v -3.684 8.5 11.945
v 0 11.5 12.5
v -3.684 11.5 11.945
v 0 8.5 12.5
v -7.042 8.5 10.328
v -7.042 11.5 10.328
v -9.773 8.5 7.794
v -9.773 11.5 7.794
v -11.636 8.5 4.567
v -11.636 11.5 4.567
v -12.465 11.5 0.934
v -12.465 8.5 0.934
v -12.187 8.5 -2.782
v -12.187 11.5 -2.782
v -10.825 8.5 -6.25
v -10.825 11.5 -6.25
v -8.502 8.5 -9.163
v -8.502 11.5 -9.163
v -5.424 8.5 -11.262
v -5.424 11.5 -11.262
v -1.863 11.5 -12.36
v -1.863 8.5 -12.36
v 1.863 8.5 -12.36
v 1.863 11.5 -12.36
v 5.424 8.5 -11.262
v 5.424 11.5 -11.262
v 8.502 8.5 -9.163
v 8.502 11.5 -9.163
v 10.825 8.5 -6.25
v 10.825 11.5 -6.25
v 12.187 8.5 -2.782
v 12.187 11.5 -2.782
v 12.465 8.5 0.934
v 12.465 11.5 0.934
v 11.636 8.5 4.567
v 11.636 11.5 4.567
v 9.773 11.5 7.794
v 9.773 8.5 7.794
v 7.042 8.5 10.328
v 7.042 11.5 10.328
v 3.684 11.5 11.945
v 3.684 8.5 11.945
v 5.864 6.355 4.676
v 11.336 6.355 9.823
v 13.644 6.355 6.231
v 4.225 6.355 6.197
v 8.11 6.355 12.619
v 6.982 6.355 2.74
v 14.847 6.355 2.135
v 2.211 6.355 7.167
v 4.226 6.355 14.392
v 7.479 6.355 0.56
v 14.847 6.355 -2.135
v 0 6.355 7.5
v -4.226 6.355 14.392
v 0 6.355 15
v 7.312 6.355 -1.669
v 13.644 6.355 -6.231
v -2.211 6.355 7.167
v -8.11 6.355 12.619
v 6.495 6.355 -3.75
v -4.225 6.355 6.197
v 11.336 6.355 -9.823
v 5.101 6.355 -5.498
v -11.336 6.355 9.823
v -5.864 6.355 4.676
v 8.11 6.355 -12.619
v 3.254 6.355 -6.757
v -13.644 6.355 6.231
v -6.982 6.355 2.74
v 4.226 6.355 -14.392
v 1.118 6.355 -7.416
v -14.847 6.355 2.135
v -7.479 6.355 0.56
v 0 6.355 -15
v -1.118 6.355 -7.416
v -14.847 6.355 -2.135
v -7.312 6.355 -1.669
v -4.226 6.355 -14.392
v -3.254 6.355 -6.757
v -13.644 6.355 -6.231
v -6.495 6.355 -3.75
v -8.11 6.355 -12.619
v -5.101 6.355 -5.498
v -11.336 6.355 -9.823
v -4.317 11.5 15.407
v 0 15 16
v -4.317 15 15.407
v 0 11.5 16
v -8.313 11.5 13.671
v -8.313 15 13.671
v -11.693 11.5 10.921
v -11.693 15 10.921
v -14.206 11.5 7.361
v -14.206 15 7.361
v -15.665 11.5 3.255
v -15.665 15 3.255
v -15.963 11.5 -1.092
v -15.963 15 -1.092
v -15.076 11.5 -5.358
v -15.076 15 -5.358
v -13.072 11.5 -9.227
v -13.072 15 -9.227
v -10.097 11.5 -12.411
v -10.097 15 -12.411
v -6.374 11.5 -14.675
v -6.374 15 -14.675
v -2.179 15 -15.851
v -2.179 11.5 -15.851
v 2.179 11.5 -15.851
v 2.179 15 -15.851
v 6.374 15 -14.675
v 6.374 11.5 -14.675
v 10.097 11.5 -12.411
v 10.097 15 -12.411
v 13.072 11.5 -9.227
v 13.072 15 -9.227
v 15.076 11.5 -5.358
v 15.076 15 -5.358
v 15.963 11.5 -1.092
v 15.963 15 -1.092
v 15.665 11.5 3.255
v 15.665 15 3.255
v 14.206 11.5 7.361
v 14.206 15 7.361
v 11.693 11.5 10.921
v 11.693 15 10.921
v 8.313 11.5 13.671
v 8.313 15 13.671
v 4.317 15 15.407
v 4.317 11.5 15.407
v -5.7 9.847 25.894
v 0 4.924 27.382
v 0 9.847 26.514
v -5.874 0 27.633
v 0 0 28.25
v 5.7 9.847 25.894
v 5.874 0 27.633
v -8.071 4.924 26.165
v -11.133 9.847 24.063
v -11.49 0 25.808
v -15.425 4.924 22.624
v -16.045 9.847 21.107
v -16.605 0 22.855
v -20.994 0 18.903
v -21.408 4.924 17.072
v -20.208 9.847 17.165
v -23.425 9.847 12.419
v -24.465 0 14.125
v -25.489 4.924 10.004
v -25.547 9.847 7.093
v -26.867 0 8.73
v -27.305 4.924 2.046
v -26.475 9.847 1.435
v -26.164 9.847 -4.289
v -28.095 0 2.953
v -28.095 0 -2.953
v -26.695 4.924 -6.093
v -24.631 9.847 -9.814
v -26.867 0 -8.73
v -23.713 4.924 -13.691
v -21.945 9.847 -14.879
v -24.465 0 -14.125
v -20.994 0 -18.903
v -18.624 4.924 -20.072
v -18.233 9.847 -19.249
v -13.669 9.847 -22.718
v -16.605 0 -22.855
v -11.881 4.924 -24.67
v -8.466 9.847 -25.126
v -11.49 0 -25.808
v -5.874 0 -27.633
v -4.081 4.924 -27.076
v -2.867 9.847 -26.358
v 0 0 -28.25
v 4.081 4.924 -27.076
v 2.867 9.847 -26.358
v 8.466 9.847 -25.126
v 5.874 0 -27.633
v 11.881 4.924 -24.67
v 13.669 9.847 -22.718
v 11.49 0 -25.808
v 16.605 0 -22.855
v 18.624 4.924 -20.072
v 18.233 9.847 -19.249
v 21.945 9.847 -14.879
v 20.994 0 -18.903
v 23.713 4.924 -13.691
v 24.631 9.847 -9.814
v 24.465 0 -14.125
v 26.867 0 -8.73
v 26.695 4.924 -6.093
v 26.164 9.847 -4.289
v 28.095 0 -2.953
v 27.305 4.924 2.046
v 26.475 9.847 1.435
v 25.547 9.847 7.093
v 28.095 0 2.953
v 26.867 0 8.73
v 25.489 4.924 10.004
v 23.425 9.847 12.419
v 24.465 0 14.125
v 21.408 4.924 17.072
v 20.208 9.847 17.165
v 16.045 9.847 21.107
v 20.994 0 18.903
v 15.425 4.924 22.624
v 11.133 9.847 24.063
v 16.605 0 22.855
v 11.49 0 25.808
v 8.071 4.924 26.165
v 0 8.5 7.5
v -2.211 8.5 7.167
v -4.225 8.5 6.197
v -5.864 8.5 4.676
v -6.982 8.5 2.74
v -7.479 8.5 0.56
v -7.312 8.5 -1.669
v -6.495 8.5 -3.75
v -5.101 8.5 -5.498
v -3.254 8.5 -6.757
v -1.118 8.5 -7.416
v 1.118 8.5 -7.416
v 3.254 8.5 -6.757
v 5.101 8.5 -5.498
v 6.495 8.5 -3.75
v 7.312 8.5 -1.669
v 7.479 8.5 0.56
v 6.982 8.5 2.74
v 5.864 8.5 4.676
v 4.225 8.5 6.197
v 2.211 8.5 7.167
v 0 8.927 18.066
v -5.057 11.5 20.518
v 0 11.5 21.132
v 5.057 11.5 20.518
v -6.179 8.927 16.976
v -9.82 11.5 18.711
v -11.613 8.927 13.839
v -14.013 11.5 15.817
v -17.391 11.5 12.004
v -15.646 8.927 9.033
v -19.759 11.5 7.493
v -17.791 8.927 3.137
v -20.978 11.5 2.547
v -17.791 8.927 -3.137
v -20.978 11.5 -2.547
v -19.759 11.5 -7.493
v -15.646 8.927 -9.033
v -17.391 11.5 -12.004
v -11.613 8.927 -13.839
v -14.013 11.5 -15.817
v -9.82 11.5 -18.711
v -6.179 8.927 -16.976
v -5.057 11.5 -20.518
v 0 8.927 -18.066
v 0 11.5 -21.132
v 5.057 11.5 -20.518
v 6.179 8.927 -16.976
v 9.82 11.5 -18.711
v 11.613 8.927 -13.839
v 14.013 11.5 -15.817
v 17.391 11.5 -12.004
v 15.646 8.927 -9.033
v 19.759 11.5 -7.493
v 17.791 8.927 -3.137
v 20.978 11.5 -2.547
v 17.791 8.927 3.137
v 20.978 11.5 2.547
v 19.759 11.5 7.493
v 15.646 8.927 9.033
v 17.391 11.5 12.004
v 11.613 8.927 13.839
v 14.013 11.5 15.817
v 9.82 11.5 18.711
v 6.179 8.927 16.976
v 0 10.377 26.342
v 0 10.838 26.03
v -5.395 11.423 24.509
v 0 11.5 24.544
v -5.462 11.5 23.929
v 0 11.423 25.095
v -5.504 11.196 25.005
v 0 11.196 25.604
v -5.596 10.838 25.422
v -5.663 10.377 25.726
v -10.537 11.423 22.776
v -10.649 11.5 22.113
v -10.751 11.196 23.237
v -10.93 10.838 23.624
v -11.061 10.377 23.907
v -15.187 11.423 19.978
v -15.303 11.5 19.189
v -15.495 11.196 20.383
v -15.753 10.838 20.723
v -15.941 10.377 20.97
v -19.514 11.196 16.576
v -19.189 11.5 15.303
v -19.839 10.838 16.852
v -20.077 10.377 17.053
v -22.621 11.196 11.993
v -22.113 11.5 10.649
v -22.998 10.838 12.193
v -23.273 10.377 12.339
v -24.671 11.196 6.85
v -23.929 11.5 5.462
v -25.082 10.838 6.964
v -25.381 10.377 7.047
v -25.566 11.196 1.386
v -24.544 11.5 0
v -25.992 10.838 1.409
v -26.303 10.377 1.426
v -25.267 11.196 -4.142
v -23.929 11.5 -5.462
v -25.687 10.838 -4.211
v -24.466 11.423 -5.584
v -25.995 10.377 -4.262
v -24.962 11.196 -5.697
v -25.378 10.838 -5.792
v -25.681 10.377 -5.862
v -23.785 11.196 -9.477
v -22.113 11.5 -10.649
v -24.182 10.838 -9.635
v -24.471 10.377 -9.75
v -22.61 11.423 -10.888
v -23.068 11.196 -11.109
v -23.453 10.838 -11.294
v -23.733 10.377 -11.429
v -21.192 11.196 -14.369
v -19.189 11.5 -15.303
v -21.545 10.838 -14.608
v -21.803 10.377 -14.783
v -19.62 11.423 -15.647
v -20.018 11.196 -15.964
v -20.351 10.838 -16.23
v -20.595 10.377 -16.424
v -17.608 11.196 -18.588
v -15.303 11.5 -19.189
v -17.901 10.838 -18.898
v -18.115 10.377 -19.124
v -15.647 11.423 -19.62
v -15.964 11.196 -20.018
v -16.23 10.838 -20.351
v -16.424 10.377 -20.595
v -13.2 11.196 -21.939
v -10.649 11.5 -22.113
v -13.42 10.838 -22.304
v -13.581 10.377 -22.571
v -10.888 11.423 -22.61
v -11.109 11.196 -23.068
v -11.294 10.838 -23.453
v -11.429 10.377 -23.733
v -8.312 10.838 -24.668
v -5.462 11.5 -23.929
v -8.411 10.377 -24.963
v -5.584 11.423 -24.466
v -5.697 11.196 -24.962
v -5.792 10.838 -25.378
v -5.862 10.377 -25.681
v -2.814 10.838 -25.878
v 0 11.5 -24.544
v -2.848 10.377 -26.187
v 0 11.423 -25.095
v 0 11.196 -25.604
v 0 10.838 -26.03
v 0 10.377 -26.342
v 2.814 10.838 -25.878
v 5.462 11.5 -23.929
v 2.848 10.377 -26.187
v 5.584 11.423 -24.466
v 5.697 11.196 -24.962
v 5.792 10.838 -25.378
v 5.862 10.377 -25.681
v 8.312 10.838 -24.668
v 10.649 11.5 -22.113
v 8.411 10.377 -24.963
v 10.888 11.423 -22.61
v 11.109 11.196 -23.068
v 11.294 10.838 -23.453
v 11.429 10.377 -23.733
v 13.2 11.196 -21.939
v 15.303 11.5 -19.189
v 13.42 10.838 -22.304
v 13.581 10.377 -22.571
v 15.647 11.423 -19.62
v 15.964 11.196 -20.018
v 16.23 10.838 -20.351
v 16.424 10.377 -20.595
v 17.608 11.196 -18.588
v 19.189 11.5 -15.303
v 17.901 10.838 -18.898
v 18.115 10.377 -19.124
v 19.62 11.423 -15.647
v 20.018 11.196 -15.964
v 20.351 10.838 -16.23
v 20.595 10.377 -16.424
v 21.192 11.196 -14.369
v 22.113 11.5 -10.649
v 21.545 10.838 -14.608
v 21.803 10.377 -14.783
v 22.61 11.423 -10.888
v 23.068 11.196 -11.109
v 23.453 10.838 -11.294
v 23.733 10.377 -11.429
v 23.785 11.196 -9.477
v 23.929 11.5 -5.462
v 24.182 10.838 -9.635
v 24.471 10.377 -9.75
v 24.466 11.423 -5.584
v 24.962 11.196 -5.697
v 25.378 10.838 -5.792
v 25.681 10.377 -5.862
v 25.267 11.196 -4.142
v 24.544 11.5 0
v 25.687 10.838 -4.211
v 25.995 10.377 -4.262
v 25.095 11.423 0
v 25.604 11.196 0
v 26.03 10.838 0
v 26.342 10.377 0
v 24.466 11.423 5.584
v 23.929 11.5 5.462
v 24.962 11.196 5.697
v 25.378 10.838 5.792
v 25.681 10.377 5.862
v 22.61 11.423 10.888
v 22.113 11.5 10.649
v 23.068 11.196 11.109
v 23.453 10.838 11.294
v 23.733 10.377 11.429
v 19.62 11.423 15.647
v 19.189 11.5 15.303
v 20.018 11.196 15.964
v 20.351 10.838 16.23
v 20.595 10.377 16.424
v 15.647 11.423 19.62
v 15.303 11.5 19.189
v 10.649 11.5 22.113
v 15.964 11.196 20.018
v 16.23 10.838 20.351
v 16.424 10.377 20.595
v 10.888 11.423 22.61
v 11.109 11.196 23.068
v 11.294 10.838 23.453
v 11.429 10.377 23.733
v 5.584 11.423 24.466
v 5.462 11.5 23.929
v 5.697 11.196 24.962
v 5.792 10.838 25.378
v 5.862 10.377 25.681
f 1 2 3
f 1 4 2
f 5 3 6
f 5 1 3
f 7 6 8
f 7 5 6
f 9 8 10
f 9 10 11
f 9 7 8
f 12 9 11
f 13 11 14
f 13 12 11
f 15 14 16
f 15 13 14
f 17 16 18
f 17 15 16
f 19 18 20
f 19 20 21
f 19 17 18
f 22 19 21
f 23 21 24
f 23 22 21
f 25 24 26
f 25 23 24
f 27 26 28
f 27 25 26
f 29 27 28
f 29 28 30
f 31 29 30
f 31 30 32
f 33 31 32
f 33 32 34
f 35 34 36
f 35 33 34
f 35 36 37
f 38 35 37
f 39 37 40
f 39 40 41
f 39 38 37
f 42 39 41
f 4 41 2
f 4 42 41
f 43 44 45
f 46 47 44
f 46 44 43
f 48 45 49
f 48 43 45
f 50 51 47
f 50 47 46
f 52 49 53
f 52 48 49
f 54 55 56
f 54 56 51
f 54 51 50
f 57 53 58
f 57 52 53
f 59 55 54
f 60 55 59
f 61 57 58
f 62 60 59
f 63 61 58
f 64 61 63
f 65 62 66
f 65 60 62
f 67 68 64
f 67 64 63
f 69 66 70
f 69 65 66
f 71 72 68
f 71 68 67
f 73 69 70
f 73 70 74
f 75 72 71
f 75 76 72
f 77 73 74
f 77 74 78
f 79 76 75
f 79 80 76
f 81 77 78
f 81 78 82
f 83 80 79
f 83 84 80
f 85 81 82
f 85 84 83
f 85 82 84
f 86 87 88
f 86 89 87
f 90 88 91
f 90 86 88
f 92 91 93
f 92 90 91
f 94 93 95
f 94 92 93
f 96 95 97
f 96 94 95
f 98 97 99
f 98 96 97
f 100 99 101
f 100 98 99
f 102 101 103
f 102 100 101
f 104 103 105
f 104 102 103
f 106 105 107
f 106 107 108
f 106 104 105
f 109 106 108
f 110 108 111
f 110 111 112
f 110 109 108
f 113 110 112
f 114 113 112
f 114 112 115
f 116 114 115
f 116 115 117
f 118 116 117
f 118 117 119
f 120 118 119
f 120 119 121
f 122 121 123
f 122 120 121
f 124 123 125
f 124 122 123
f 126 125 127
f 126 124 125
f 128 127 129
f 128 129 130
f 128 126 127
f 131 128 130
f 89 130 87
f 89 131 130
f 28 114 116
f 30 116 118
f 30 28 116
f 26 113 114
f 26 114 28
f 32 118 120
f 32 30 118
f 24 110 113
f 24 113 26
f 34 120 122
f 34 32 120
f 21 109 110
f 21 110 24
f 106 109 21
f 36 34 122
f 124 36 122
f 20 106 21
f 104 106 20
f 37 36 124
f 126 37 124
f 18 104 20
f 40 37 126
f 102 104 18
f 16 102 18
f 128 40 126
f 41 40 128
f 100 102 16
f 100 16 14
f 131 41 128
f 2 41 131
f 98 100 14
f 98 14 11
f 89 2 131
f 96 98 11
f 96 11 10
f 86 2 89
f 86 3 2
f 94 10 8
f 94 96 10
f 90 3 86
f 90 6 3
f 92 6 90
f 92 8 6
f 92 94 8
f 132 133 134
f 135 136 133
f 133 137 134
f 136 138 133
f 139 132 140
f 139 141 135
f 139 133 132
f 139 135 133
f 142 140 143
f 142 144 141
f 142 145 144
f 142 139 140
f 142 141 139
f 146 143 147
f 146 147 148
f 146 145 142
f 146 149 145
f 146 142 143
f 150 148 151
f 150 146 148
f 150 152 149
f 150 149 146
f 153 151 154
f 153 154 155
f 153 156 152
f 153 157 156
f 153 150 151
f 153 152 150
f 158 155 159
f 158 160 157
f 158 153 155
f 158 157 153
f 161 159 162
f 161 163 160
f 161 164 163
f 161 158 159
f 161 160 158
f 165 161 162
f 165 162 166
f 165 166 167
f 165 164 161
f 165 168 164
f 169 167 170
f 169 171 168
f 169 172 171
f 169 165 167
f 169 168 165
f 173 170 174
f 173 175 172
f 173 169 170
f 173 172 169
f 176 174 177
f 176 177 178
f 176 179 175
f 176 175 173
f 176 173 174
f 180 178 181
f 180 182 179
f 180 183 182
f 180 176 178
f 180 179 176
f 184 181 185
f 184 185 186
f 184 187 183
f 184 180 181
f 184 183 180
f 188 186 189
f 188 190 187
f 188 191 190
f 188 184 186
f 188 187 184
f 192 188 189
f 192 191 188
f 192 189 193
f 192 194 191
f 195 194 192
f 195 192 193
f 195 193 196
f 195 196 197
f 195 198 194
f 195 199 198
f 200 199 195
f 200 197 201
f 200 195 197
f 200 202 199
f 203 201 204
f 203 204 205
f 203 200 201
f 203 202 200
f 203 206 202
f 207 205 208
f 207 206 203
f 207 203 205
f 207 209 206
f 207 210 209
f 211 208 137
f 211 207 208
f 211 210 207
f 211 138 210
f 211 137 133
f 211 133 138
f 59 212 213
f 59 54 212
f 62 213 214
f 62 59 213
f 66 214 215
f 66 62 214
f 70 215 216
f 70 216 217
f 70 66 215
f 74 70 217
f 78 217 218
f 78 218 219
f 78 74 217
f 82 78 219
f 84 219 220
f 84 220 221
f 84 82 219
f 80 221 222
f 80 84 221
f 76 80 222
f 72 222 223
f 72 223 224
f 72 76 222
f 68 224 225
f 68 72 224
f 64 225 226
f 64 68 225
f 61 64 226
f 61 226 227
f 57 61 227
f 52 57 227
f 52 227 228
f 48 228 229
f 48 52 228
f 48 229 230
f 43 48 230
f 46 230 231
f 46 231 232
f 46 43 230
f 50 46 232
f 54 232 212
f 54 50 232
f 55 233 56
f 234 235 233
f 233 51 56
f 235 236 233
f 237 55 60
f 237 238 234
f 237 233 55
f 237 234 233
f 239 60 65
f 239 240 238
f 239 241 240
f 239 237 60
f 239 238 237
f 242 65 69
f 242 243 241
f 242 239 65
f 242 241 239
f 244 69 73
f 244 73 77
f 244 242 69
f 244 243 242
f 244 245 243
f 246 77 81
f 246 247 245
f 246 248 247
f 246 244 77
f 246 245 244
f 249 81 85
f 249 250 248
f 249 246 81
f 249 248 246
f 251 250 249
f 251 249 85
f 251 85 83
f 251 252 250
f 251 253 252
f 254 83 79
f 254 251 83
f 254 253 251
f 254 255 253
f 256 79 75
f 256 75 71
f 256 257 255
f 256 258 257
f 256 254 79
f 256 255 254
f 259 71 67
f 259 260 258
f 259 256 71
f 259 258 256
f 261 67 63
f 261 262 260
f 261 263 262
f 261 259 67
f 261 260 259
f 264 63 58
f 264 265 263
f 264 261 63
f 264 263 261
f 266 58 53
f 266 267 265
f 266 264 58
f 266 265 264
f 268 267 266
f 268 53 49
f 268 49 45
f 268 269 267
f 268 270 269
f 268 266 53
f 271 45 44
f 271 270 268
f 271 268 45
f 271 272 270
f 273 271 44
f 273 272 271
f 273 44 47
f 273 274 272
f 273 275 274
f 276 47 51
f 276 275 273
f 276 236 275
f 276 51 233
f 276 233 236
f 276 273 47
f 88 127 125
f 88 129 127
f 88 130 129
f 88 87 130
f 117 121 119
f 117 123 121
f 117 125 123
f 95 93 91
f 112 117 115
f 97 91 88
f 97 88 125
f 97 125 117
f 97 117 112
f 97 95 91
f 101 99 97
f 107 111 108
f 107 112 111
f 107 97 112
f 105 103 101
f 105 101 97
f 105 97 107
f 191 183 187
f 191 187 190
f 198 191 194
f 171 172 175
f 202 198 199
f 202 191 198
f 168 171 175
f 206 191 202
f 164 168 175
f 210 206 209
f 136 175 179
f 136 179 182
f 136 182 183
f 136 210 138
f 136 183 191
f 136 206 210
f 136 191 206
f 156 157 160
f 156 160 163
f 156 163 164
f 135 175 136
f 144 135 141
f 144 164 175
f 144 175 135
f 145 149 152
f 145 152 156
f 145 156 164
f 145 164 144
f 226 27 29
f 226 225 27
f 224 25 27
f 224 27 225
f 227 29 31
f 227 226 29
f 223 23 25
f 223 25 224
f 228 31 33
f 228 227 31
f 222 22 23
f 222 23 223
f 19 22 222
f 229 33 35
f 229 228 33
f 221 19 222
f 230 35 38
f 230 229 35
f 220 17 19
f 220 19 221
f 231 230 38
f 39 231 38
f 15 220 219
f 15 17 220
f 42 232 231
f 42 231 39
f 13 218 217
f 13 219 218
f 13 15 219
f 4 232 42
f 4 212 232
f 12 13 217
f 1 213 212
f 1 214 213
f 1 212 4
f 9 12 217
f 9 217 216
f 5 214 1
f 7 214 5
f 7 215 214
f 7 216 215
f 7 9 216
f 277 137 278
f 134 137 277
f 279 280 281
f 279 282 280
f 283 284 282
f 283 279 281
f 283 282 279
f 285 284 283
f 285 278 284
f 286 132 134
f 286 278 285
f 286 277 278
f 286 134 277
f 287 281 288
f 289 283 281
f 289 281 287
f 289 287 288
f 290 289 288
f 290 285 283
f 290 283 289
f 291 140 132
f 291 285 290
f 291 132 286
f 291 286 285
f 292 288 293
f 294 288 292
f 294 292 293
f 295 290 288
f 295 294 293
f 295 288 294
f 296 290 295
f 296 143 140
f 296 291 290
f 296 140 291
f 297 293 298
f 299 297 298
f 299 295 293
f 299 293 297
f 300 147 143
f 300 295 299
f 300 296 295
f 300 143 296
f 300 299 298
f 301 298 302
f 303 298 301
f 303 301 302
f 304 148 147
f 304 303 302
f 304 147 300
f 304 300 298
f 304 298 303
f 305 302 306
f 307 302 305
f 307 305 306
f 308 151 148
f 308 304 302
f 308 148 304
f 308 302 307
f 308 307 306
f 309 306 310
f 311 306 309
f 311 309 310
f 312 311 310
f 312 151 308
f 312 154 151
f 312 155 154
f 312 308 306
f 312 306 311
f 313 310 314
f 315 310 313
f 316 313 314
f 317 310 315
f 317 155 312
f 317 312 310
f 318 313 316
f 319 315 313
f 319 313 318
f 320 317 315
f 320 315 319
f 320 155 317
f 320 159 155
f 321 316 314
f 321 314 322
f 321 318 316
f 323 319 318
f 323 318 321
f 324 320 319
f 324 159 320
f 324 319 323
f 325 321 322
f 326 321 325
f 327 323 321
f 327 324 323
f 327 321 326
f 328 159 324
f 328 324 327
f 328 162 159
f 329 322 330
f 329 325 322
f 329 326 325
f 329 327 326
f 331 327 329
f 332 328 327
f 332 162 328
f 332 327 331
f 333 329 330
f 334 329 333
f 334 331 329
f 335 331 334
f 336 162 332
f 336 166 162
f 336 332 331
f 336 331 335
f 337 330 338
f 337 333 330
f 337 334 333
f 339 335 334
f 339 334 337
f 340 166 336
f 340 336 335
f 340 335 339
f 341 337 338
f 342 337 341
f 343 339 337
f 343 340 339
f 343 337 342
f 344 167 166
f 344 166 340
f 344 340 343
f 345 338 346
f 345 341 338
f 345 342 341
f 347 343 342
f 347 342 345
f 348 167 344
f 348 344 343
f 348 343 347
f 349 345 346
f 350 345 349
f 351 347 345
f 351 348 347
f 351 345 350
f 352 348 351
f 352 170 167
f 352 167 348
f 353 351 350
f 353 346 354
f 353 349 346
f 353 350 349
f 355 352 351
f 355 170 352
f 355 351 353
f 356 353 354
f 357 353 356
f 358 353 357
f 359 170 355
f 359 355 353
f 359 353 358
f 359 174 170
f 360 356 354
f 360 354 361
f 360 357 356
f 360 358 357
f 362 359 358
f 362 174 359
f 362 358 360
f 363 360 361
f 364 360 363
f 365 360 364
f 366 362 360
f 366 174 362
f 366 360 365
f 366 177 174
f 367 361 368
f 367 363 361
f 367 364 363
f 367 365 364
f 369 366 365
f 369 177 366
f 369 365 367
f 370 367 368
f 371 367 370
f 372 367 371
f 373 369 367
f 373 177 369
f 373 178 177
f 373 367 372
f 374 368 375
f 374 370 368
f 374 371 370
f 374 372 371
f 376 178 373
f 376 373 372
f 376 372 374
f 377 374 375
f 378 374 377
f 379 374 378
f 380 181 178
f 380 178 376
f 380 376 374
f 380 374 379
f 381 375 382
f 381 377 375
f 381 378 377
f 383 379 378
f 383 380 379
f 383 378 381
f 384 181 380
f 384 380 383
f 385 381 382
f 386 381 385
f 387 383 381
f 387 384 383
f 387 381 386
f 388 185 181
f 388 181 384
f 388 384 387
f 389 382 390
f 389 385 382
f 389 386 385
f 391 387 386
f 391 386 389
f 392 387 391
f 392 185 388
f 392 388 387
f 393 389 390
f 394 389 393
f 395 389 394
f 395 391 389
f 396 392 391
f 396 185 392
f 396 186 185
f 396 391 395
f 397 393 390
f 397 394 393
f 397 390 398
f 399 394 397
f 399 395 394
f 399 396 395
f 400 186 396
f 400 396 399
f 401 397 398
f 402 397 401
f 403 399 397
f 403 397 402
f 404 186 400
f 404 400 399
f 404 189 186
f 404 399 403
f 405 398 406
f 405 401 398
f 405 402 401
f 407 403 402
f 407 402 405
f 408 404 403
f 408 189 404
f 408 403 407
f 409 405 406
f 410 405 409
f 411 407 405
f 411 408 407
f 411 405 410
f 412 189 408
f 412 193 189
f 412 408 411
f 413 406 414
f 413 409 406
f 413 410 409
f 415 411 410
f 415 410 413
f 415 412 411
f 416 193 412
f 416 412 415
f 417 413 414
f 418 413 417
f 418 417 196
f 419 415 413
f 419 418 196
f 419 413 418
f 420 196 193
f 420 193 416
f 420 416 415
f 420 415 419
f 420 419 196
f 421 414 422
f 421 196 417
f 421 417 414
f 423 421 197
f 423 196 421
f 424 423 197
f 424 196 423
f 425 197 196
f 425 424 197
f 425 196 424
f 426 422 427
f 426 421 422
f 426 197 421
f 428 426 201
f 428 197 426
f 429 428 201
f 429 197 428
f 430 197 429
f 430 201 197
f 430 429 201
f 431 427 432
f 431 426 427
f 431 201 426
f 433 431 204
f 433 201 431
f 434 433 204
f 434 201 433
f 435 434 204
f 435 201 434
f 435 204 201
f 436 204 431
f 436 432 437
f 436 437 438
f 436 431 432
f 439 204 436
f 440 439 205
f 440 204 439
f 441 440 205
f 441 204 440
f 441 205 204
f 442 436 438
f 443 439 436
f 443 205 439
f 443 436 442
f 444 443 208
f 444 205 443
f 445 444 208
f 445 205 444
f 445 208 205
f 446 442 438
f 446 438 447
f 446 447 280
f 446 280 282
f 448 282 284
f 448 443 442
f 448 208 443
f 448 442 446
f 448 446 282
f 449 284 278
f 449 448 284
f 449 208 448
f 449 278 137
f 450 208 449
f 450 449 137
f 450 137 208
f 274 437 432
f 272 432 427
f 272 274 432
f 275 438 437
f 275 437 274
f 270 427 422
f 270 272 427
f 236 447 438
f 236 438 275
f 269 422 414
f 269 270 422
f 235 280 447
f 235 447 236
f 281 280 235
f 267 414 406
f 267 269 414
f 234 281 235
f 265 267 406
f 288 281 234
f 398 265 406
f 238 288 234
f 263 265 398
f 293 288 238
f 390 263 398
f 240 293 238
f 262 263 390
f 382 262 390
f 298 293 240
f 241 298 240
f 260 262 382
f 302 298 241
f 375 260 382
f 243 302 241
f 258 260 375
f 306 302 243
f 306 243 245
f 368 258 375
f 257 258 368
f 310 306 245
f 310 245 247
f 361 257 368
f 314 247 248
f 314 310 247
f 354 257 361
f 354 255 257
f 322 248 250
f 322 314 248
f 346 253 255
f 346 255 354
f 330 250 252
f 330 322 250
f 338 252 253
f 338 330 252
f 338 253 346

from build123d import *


with BuildPart() as part:
    # Sketch1 → Revolve1 (revolve)
    with BuildSketch(Plane.XY, mode=Mode.PRIVATE) as revolve1_sk:
        with BuildLine():
            Line((0, 0), (0, 15))
            Line((0, 15), (-16, 15))
            Line((-16, 15), (-16, 11.5))
            Line((-16, 11.5), (-12.5, 11.5))
            Line((-12.5, 11.5), (-12.5, 8.5))
            Line((-12.5, 8.5), (-7.5, 8.5))
            Line((-7.5, 8.5), (-7.5, 6.35483871))
            Line((-7.5, 6.35483871), (-15, 6.35483871))
            Line((-15, 6.35483871), (-21.131764452, 11.5))
            Line((-21.131764452, 11.5), (-24.544040459, 11.5))
            ThreePointArc((-24.544040459, 11.5), (-25.829615679, 11.032088886), (-26.513655966, 9.847296355))
            Line((-26.513655966, 9.847296355), (-28.25, 0))
            Line((-28.25, 0), (0, 0))
        make_face()
    revolve(revolve1_sk.sketch.rotate(Axis((0, 0, 0), (0, -1, 0)), 270), axis=Axis((0, 0, 0), (0, -1, 0)))


solid = part.part
